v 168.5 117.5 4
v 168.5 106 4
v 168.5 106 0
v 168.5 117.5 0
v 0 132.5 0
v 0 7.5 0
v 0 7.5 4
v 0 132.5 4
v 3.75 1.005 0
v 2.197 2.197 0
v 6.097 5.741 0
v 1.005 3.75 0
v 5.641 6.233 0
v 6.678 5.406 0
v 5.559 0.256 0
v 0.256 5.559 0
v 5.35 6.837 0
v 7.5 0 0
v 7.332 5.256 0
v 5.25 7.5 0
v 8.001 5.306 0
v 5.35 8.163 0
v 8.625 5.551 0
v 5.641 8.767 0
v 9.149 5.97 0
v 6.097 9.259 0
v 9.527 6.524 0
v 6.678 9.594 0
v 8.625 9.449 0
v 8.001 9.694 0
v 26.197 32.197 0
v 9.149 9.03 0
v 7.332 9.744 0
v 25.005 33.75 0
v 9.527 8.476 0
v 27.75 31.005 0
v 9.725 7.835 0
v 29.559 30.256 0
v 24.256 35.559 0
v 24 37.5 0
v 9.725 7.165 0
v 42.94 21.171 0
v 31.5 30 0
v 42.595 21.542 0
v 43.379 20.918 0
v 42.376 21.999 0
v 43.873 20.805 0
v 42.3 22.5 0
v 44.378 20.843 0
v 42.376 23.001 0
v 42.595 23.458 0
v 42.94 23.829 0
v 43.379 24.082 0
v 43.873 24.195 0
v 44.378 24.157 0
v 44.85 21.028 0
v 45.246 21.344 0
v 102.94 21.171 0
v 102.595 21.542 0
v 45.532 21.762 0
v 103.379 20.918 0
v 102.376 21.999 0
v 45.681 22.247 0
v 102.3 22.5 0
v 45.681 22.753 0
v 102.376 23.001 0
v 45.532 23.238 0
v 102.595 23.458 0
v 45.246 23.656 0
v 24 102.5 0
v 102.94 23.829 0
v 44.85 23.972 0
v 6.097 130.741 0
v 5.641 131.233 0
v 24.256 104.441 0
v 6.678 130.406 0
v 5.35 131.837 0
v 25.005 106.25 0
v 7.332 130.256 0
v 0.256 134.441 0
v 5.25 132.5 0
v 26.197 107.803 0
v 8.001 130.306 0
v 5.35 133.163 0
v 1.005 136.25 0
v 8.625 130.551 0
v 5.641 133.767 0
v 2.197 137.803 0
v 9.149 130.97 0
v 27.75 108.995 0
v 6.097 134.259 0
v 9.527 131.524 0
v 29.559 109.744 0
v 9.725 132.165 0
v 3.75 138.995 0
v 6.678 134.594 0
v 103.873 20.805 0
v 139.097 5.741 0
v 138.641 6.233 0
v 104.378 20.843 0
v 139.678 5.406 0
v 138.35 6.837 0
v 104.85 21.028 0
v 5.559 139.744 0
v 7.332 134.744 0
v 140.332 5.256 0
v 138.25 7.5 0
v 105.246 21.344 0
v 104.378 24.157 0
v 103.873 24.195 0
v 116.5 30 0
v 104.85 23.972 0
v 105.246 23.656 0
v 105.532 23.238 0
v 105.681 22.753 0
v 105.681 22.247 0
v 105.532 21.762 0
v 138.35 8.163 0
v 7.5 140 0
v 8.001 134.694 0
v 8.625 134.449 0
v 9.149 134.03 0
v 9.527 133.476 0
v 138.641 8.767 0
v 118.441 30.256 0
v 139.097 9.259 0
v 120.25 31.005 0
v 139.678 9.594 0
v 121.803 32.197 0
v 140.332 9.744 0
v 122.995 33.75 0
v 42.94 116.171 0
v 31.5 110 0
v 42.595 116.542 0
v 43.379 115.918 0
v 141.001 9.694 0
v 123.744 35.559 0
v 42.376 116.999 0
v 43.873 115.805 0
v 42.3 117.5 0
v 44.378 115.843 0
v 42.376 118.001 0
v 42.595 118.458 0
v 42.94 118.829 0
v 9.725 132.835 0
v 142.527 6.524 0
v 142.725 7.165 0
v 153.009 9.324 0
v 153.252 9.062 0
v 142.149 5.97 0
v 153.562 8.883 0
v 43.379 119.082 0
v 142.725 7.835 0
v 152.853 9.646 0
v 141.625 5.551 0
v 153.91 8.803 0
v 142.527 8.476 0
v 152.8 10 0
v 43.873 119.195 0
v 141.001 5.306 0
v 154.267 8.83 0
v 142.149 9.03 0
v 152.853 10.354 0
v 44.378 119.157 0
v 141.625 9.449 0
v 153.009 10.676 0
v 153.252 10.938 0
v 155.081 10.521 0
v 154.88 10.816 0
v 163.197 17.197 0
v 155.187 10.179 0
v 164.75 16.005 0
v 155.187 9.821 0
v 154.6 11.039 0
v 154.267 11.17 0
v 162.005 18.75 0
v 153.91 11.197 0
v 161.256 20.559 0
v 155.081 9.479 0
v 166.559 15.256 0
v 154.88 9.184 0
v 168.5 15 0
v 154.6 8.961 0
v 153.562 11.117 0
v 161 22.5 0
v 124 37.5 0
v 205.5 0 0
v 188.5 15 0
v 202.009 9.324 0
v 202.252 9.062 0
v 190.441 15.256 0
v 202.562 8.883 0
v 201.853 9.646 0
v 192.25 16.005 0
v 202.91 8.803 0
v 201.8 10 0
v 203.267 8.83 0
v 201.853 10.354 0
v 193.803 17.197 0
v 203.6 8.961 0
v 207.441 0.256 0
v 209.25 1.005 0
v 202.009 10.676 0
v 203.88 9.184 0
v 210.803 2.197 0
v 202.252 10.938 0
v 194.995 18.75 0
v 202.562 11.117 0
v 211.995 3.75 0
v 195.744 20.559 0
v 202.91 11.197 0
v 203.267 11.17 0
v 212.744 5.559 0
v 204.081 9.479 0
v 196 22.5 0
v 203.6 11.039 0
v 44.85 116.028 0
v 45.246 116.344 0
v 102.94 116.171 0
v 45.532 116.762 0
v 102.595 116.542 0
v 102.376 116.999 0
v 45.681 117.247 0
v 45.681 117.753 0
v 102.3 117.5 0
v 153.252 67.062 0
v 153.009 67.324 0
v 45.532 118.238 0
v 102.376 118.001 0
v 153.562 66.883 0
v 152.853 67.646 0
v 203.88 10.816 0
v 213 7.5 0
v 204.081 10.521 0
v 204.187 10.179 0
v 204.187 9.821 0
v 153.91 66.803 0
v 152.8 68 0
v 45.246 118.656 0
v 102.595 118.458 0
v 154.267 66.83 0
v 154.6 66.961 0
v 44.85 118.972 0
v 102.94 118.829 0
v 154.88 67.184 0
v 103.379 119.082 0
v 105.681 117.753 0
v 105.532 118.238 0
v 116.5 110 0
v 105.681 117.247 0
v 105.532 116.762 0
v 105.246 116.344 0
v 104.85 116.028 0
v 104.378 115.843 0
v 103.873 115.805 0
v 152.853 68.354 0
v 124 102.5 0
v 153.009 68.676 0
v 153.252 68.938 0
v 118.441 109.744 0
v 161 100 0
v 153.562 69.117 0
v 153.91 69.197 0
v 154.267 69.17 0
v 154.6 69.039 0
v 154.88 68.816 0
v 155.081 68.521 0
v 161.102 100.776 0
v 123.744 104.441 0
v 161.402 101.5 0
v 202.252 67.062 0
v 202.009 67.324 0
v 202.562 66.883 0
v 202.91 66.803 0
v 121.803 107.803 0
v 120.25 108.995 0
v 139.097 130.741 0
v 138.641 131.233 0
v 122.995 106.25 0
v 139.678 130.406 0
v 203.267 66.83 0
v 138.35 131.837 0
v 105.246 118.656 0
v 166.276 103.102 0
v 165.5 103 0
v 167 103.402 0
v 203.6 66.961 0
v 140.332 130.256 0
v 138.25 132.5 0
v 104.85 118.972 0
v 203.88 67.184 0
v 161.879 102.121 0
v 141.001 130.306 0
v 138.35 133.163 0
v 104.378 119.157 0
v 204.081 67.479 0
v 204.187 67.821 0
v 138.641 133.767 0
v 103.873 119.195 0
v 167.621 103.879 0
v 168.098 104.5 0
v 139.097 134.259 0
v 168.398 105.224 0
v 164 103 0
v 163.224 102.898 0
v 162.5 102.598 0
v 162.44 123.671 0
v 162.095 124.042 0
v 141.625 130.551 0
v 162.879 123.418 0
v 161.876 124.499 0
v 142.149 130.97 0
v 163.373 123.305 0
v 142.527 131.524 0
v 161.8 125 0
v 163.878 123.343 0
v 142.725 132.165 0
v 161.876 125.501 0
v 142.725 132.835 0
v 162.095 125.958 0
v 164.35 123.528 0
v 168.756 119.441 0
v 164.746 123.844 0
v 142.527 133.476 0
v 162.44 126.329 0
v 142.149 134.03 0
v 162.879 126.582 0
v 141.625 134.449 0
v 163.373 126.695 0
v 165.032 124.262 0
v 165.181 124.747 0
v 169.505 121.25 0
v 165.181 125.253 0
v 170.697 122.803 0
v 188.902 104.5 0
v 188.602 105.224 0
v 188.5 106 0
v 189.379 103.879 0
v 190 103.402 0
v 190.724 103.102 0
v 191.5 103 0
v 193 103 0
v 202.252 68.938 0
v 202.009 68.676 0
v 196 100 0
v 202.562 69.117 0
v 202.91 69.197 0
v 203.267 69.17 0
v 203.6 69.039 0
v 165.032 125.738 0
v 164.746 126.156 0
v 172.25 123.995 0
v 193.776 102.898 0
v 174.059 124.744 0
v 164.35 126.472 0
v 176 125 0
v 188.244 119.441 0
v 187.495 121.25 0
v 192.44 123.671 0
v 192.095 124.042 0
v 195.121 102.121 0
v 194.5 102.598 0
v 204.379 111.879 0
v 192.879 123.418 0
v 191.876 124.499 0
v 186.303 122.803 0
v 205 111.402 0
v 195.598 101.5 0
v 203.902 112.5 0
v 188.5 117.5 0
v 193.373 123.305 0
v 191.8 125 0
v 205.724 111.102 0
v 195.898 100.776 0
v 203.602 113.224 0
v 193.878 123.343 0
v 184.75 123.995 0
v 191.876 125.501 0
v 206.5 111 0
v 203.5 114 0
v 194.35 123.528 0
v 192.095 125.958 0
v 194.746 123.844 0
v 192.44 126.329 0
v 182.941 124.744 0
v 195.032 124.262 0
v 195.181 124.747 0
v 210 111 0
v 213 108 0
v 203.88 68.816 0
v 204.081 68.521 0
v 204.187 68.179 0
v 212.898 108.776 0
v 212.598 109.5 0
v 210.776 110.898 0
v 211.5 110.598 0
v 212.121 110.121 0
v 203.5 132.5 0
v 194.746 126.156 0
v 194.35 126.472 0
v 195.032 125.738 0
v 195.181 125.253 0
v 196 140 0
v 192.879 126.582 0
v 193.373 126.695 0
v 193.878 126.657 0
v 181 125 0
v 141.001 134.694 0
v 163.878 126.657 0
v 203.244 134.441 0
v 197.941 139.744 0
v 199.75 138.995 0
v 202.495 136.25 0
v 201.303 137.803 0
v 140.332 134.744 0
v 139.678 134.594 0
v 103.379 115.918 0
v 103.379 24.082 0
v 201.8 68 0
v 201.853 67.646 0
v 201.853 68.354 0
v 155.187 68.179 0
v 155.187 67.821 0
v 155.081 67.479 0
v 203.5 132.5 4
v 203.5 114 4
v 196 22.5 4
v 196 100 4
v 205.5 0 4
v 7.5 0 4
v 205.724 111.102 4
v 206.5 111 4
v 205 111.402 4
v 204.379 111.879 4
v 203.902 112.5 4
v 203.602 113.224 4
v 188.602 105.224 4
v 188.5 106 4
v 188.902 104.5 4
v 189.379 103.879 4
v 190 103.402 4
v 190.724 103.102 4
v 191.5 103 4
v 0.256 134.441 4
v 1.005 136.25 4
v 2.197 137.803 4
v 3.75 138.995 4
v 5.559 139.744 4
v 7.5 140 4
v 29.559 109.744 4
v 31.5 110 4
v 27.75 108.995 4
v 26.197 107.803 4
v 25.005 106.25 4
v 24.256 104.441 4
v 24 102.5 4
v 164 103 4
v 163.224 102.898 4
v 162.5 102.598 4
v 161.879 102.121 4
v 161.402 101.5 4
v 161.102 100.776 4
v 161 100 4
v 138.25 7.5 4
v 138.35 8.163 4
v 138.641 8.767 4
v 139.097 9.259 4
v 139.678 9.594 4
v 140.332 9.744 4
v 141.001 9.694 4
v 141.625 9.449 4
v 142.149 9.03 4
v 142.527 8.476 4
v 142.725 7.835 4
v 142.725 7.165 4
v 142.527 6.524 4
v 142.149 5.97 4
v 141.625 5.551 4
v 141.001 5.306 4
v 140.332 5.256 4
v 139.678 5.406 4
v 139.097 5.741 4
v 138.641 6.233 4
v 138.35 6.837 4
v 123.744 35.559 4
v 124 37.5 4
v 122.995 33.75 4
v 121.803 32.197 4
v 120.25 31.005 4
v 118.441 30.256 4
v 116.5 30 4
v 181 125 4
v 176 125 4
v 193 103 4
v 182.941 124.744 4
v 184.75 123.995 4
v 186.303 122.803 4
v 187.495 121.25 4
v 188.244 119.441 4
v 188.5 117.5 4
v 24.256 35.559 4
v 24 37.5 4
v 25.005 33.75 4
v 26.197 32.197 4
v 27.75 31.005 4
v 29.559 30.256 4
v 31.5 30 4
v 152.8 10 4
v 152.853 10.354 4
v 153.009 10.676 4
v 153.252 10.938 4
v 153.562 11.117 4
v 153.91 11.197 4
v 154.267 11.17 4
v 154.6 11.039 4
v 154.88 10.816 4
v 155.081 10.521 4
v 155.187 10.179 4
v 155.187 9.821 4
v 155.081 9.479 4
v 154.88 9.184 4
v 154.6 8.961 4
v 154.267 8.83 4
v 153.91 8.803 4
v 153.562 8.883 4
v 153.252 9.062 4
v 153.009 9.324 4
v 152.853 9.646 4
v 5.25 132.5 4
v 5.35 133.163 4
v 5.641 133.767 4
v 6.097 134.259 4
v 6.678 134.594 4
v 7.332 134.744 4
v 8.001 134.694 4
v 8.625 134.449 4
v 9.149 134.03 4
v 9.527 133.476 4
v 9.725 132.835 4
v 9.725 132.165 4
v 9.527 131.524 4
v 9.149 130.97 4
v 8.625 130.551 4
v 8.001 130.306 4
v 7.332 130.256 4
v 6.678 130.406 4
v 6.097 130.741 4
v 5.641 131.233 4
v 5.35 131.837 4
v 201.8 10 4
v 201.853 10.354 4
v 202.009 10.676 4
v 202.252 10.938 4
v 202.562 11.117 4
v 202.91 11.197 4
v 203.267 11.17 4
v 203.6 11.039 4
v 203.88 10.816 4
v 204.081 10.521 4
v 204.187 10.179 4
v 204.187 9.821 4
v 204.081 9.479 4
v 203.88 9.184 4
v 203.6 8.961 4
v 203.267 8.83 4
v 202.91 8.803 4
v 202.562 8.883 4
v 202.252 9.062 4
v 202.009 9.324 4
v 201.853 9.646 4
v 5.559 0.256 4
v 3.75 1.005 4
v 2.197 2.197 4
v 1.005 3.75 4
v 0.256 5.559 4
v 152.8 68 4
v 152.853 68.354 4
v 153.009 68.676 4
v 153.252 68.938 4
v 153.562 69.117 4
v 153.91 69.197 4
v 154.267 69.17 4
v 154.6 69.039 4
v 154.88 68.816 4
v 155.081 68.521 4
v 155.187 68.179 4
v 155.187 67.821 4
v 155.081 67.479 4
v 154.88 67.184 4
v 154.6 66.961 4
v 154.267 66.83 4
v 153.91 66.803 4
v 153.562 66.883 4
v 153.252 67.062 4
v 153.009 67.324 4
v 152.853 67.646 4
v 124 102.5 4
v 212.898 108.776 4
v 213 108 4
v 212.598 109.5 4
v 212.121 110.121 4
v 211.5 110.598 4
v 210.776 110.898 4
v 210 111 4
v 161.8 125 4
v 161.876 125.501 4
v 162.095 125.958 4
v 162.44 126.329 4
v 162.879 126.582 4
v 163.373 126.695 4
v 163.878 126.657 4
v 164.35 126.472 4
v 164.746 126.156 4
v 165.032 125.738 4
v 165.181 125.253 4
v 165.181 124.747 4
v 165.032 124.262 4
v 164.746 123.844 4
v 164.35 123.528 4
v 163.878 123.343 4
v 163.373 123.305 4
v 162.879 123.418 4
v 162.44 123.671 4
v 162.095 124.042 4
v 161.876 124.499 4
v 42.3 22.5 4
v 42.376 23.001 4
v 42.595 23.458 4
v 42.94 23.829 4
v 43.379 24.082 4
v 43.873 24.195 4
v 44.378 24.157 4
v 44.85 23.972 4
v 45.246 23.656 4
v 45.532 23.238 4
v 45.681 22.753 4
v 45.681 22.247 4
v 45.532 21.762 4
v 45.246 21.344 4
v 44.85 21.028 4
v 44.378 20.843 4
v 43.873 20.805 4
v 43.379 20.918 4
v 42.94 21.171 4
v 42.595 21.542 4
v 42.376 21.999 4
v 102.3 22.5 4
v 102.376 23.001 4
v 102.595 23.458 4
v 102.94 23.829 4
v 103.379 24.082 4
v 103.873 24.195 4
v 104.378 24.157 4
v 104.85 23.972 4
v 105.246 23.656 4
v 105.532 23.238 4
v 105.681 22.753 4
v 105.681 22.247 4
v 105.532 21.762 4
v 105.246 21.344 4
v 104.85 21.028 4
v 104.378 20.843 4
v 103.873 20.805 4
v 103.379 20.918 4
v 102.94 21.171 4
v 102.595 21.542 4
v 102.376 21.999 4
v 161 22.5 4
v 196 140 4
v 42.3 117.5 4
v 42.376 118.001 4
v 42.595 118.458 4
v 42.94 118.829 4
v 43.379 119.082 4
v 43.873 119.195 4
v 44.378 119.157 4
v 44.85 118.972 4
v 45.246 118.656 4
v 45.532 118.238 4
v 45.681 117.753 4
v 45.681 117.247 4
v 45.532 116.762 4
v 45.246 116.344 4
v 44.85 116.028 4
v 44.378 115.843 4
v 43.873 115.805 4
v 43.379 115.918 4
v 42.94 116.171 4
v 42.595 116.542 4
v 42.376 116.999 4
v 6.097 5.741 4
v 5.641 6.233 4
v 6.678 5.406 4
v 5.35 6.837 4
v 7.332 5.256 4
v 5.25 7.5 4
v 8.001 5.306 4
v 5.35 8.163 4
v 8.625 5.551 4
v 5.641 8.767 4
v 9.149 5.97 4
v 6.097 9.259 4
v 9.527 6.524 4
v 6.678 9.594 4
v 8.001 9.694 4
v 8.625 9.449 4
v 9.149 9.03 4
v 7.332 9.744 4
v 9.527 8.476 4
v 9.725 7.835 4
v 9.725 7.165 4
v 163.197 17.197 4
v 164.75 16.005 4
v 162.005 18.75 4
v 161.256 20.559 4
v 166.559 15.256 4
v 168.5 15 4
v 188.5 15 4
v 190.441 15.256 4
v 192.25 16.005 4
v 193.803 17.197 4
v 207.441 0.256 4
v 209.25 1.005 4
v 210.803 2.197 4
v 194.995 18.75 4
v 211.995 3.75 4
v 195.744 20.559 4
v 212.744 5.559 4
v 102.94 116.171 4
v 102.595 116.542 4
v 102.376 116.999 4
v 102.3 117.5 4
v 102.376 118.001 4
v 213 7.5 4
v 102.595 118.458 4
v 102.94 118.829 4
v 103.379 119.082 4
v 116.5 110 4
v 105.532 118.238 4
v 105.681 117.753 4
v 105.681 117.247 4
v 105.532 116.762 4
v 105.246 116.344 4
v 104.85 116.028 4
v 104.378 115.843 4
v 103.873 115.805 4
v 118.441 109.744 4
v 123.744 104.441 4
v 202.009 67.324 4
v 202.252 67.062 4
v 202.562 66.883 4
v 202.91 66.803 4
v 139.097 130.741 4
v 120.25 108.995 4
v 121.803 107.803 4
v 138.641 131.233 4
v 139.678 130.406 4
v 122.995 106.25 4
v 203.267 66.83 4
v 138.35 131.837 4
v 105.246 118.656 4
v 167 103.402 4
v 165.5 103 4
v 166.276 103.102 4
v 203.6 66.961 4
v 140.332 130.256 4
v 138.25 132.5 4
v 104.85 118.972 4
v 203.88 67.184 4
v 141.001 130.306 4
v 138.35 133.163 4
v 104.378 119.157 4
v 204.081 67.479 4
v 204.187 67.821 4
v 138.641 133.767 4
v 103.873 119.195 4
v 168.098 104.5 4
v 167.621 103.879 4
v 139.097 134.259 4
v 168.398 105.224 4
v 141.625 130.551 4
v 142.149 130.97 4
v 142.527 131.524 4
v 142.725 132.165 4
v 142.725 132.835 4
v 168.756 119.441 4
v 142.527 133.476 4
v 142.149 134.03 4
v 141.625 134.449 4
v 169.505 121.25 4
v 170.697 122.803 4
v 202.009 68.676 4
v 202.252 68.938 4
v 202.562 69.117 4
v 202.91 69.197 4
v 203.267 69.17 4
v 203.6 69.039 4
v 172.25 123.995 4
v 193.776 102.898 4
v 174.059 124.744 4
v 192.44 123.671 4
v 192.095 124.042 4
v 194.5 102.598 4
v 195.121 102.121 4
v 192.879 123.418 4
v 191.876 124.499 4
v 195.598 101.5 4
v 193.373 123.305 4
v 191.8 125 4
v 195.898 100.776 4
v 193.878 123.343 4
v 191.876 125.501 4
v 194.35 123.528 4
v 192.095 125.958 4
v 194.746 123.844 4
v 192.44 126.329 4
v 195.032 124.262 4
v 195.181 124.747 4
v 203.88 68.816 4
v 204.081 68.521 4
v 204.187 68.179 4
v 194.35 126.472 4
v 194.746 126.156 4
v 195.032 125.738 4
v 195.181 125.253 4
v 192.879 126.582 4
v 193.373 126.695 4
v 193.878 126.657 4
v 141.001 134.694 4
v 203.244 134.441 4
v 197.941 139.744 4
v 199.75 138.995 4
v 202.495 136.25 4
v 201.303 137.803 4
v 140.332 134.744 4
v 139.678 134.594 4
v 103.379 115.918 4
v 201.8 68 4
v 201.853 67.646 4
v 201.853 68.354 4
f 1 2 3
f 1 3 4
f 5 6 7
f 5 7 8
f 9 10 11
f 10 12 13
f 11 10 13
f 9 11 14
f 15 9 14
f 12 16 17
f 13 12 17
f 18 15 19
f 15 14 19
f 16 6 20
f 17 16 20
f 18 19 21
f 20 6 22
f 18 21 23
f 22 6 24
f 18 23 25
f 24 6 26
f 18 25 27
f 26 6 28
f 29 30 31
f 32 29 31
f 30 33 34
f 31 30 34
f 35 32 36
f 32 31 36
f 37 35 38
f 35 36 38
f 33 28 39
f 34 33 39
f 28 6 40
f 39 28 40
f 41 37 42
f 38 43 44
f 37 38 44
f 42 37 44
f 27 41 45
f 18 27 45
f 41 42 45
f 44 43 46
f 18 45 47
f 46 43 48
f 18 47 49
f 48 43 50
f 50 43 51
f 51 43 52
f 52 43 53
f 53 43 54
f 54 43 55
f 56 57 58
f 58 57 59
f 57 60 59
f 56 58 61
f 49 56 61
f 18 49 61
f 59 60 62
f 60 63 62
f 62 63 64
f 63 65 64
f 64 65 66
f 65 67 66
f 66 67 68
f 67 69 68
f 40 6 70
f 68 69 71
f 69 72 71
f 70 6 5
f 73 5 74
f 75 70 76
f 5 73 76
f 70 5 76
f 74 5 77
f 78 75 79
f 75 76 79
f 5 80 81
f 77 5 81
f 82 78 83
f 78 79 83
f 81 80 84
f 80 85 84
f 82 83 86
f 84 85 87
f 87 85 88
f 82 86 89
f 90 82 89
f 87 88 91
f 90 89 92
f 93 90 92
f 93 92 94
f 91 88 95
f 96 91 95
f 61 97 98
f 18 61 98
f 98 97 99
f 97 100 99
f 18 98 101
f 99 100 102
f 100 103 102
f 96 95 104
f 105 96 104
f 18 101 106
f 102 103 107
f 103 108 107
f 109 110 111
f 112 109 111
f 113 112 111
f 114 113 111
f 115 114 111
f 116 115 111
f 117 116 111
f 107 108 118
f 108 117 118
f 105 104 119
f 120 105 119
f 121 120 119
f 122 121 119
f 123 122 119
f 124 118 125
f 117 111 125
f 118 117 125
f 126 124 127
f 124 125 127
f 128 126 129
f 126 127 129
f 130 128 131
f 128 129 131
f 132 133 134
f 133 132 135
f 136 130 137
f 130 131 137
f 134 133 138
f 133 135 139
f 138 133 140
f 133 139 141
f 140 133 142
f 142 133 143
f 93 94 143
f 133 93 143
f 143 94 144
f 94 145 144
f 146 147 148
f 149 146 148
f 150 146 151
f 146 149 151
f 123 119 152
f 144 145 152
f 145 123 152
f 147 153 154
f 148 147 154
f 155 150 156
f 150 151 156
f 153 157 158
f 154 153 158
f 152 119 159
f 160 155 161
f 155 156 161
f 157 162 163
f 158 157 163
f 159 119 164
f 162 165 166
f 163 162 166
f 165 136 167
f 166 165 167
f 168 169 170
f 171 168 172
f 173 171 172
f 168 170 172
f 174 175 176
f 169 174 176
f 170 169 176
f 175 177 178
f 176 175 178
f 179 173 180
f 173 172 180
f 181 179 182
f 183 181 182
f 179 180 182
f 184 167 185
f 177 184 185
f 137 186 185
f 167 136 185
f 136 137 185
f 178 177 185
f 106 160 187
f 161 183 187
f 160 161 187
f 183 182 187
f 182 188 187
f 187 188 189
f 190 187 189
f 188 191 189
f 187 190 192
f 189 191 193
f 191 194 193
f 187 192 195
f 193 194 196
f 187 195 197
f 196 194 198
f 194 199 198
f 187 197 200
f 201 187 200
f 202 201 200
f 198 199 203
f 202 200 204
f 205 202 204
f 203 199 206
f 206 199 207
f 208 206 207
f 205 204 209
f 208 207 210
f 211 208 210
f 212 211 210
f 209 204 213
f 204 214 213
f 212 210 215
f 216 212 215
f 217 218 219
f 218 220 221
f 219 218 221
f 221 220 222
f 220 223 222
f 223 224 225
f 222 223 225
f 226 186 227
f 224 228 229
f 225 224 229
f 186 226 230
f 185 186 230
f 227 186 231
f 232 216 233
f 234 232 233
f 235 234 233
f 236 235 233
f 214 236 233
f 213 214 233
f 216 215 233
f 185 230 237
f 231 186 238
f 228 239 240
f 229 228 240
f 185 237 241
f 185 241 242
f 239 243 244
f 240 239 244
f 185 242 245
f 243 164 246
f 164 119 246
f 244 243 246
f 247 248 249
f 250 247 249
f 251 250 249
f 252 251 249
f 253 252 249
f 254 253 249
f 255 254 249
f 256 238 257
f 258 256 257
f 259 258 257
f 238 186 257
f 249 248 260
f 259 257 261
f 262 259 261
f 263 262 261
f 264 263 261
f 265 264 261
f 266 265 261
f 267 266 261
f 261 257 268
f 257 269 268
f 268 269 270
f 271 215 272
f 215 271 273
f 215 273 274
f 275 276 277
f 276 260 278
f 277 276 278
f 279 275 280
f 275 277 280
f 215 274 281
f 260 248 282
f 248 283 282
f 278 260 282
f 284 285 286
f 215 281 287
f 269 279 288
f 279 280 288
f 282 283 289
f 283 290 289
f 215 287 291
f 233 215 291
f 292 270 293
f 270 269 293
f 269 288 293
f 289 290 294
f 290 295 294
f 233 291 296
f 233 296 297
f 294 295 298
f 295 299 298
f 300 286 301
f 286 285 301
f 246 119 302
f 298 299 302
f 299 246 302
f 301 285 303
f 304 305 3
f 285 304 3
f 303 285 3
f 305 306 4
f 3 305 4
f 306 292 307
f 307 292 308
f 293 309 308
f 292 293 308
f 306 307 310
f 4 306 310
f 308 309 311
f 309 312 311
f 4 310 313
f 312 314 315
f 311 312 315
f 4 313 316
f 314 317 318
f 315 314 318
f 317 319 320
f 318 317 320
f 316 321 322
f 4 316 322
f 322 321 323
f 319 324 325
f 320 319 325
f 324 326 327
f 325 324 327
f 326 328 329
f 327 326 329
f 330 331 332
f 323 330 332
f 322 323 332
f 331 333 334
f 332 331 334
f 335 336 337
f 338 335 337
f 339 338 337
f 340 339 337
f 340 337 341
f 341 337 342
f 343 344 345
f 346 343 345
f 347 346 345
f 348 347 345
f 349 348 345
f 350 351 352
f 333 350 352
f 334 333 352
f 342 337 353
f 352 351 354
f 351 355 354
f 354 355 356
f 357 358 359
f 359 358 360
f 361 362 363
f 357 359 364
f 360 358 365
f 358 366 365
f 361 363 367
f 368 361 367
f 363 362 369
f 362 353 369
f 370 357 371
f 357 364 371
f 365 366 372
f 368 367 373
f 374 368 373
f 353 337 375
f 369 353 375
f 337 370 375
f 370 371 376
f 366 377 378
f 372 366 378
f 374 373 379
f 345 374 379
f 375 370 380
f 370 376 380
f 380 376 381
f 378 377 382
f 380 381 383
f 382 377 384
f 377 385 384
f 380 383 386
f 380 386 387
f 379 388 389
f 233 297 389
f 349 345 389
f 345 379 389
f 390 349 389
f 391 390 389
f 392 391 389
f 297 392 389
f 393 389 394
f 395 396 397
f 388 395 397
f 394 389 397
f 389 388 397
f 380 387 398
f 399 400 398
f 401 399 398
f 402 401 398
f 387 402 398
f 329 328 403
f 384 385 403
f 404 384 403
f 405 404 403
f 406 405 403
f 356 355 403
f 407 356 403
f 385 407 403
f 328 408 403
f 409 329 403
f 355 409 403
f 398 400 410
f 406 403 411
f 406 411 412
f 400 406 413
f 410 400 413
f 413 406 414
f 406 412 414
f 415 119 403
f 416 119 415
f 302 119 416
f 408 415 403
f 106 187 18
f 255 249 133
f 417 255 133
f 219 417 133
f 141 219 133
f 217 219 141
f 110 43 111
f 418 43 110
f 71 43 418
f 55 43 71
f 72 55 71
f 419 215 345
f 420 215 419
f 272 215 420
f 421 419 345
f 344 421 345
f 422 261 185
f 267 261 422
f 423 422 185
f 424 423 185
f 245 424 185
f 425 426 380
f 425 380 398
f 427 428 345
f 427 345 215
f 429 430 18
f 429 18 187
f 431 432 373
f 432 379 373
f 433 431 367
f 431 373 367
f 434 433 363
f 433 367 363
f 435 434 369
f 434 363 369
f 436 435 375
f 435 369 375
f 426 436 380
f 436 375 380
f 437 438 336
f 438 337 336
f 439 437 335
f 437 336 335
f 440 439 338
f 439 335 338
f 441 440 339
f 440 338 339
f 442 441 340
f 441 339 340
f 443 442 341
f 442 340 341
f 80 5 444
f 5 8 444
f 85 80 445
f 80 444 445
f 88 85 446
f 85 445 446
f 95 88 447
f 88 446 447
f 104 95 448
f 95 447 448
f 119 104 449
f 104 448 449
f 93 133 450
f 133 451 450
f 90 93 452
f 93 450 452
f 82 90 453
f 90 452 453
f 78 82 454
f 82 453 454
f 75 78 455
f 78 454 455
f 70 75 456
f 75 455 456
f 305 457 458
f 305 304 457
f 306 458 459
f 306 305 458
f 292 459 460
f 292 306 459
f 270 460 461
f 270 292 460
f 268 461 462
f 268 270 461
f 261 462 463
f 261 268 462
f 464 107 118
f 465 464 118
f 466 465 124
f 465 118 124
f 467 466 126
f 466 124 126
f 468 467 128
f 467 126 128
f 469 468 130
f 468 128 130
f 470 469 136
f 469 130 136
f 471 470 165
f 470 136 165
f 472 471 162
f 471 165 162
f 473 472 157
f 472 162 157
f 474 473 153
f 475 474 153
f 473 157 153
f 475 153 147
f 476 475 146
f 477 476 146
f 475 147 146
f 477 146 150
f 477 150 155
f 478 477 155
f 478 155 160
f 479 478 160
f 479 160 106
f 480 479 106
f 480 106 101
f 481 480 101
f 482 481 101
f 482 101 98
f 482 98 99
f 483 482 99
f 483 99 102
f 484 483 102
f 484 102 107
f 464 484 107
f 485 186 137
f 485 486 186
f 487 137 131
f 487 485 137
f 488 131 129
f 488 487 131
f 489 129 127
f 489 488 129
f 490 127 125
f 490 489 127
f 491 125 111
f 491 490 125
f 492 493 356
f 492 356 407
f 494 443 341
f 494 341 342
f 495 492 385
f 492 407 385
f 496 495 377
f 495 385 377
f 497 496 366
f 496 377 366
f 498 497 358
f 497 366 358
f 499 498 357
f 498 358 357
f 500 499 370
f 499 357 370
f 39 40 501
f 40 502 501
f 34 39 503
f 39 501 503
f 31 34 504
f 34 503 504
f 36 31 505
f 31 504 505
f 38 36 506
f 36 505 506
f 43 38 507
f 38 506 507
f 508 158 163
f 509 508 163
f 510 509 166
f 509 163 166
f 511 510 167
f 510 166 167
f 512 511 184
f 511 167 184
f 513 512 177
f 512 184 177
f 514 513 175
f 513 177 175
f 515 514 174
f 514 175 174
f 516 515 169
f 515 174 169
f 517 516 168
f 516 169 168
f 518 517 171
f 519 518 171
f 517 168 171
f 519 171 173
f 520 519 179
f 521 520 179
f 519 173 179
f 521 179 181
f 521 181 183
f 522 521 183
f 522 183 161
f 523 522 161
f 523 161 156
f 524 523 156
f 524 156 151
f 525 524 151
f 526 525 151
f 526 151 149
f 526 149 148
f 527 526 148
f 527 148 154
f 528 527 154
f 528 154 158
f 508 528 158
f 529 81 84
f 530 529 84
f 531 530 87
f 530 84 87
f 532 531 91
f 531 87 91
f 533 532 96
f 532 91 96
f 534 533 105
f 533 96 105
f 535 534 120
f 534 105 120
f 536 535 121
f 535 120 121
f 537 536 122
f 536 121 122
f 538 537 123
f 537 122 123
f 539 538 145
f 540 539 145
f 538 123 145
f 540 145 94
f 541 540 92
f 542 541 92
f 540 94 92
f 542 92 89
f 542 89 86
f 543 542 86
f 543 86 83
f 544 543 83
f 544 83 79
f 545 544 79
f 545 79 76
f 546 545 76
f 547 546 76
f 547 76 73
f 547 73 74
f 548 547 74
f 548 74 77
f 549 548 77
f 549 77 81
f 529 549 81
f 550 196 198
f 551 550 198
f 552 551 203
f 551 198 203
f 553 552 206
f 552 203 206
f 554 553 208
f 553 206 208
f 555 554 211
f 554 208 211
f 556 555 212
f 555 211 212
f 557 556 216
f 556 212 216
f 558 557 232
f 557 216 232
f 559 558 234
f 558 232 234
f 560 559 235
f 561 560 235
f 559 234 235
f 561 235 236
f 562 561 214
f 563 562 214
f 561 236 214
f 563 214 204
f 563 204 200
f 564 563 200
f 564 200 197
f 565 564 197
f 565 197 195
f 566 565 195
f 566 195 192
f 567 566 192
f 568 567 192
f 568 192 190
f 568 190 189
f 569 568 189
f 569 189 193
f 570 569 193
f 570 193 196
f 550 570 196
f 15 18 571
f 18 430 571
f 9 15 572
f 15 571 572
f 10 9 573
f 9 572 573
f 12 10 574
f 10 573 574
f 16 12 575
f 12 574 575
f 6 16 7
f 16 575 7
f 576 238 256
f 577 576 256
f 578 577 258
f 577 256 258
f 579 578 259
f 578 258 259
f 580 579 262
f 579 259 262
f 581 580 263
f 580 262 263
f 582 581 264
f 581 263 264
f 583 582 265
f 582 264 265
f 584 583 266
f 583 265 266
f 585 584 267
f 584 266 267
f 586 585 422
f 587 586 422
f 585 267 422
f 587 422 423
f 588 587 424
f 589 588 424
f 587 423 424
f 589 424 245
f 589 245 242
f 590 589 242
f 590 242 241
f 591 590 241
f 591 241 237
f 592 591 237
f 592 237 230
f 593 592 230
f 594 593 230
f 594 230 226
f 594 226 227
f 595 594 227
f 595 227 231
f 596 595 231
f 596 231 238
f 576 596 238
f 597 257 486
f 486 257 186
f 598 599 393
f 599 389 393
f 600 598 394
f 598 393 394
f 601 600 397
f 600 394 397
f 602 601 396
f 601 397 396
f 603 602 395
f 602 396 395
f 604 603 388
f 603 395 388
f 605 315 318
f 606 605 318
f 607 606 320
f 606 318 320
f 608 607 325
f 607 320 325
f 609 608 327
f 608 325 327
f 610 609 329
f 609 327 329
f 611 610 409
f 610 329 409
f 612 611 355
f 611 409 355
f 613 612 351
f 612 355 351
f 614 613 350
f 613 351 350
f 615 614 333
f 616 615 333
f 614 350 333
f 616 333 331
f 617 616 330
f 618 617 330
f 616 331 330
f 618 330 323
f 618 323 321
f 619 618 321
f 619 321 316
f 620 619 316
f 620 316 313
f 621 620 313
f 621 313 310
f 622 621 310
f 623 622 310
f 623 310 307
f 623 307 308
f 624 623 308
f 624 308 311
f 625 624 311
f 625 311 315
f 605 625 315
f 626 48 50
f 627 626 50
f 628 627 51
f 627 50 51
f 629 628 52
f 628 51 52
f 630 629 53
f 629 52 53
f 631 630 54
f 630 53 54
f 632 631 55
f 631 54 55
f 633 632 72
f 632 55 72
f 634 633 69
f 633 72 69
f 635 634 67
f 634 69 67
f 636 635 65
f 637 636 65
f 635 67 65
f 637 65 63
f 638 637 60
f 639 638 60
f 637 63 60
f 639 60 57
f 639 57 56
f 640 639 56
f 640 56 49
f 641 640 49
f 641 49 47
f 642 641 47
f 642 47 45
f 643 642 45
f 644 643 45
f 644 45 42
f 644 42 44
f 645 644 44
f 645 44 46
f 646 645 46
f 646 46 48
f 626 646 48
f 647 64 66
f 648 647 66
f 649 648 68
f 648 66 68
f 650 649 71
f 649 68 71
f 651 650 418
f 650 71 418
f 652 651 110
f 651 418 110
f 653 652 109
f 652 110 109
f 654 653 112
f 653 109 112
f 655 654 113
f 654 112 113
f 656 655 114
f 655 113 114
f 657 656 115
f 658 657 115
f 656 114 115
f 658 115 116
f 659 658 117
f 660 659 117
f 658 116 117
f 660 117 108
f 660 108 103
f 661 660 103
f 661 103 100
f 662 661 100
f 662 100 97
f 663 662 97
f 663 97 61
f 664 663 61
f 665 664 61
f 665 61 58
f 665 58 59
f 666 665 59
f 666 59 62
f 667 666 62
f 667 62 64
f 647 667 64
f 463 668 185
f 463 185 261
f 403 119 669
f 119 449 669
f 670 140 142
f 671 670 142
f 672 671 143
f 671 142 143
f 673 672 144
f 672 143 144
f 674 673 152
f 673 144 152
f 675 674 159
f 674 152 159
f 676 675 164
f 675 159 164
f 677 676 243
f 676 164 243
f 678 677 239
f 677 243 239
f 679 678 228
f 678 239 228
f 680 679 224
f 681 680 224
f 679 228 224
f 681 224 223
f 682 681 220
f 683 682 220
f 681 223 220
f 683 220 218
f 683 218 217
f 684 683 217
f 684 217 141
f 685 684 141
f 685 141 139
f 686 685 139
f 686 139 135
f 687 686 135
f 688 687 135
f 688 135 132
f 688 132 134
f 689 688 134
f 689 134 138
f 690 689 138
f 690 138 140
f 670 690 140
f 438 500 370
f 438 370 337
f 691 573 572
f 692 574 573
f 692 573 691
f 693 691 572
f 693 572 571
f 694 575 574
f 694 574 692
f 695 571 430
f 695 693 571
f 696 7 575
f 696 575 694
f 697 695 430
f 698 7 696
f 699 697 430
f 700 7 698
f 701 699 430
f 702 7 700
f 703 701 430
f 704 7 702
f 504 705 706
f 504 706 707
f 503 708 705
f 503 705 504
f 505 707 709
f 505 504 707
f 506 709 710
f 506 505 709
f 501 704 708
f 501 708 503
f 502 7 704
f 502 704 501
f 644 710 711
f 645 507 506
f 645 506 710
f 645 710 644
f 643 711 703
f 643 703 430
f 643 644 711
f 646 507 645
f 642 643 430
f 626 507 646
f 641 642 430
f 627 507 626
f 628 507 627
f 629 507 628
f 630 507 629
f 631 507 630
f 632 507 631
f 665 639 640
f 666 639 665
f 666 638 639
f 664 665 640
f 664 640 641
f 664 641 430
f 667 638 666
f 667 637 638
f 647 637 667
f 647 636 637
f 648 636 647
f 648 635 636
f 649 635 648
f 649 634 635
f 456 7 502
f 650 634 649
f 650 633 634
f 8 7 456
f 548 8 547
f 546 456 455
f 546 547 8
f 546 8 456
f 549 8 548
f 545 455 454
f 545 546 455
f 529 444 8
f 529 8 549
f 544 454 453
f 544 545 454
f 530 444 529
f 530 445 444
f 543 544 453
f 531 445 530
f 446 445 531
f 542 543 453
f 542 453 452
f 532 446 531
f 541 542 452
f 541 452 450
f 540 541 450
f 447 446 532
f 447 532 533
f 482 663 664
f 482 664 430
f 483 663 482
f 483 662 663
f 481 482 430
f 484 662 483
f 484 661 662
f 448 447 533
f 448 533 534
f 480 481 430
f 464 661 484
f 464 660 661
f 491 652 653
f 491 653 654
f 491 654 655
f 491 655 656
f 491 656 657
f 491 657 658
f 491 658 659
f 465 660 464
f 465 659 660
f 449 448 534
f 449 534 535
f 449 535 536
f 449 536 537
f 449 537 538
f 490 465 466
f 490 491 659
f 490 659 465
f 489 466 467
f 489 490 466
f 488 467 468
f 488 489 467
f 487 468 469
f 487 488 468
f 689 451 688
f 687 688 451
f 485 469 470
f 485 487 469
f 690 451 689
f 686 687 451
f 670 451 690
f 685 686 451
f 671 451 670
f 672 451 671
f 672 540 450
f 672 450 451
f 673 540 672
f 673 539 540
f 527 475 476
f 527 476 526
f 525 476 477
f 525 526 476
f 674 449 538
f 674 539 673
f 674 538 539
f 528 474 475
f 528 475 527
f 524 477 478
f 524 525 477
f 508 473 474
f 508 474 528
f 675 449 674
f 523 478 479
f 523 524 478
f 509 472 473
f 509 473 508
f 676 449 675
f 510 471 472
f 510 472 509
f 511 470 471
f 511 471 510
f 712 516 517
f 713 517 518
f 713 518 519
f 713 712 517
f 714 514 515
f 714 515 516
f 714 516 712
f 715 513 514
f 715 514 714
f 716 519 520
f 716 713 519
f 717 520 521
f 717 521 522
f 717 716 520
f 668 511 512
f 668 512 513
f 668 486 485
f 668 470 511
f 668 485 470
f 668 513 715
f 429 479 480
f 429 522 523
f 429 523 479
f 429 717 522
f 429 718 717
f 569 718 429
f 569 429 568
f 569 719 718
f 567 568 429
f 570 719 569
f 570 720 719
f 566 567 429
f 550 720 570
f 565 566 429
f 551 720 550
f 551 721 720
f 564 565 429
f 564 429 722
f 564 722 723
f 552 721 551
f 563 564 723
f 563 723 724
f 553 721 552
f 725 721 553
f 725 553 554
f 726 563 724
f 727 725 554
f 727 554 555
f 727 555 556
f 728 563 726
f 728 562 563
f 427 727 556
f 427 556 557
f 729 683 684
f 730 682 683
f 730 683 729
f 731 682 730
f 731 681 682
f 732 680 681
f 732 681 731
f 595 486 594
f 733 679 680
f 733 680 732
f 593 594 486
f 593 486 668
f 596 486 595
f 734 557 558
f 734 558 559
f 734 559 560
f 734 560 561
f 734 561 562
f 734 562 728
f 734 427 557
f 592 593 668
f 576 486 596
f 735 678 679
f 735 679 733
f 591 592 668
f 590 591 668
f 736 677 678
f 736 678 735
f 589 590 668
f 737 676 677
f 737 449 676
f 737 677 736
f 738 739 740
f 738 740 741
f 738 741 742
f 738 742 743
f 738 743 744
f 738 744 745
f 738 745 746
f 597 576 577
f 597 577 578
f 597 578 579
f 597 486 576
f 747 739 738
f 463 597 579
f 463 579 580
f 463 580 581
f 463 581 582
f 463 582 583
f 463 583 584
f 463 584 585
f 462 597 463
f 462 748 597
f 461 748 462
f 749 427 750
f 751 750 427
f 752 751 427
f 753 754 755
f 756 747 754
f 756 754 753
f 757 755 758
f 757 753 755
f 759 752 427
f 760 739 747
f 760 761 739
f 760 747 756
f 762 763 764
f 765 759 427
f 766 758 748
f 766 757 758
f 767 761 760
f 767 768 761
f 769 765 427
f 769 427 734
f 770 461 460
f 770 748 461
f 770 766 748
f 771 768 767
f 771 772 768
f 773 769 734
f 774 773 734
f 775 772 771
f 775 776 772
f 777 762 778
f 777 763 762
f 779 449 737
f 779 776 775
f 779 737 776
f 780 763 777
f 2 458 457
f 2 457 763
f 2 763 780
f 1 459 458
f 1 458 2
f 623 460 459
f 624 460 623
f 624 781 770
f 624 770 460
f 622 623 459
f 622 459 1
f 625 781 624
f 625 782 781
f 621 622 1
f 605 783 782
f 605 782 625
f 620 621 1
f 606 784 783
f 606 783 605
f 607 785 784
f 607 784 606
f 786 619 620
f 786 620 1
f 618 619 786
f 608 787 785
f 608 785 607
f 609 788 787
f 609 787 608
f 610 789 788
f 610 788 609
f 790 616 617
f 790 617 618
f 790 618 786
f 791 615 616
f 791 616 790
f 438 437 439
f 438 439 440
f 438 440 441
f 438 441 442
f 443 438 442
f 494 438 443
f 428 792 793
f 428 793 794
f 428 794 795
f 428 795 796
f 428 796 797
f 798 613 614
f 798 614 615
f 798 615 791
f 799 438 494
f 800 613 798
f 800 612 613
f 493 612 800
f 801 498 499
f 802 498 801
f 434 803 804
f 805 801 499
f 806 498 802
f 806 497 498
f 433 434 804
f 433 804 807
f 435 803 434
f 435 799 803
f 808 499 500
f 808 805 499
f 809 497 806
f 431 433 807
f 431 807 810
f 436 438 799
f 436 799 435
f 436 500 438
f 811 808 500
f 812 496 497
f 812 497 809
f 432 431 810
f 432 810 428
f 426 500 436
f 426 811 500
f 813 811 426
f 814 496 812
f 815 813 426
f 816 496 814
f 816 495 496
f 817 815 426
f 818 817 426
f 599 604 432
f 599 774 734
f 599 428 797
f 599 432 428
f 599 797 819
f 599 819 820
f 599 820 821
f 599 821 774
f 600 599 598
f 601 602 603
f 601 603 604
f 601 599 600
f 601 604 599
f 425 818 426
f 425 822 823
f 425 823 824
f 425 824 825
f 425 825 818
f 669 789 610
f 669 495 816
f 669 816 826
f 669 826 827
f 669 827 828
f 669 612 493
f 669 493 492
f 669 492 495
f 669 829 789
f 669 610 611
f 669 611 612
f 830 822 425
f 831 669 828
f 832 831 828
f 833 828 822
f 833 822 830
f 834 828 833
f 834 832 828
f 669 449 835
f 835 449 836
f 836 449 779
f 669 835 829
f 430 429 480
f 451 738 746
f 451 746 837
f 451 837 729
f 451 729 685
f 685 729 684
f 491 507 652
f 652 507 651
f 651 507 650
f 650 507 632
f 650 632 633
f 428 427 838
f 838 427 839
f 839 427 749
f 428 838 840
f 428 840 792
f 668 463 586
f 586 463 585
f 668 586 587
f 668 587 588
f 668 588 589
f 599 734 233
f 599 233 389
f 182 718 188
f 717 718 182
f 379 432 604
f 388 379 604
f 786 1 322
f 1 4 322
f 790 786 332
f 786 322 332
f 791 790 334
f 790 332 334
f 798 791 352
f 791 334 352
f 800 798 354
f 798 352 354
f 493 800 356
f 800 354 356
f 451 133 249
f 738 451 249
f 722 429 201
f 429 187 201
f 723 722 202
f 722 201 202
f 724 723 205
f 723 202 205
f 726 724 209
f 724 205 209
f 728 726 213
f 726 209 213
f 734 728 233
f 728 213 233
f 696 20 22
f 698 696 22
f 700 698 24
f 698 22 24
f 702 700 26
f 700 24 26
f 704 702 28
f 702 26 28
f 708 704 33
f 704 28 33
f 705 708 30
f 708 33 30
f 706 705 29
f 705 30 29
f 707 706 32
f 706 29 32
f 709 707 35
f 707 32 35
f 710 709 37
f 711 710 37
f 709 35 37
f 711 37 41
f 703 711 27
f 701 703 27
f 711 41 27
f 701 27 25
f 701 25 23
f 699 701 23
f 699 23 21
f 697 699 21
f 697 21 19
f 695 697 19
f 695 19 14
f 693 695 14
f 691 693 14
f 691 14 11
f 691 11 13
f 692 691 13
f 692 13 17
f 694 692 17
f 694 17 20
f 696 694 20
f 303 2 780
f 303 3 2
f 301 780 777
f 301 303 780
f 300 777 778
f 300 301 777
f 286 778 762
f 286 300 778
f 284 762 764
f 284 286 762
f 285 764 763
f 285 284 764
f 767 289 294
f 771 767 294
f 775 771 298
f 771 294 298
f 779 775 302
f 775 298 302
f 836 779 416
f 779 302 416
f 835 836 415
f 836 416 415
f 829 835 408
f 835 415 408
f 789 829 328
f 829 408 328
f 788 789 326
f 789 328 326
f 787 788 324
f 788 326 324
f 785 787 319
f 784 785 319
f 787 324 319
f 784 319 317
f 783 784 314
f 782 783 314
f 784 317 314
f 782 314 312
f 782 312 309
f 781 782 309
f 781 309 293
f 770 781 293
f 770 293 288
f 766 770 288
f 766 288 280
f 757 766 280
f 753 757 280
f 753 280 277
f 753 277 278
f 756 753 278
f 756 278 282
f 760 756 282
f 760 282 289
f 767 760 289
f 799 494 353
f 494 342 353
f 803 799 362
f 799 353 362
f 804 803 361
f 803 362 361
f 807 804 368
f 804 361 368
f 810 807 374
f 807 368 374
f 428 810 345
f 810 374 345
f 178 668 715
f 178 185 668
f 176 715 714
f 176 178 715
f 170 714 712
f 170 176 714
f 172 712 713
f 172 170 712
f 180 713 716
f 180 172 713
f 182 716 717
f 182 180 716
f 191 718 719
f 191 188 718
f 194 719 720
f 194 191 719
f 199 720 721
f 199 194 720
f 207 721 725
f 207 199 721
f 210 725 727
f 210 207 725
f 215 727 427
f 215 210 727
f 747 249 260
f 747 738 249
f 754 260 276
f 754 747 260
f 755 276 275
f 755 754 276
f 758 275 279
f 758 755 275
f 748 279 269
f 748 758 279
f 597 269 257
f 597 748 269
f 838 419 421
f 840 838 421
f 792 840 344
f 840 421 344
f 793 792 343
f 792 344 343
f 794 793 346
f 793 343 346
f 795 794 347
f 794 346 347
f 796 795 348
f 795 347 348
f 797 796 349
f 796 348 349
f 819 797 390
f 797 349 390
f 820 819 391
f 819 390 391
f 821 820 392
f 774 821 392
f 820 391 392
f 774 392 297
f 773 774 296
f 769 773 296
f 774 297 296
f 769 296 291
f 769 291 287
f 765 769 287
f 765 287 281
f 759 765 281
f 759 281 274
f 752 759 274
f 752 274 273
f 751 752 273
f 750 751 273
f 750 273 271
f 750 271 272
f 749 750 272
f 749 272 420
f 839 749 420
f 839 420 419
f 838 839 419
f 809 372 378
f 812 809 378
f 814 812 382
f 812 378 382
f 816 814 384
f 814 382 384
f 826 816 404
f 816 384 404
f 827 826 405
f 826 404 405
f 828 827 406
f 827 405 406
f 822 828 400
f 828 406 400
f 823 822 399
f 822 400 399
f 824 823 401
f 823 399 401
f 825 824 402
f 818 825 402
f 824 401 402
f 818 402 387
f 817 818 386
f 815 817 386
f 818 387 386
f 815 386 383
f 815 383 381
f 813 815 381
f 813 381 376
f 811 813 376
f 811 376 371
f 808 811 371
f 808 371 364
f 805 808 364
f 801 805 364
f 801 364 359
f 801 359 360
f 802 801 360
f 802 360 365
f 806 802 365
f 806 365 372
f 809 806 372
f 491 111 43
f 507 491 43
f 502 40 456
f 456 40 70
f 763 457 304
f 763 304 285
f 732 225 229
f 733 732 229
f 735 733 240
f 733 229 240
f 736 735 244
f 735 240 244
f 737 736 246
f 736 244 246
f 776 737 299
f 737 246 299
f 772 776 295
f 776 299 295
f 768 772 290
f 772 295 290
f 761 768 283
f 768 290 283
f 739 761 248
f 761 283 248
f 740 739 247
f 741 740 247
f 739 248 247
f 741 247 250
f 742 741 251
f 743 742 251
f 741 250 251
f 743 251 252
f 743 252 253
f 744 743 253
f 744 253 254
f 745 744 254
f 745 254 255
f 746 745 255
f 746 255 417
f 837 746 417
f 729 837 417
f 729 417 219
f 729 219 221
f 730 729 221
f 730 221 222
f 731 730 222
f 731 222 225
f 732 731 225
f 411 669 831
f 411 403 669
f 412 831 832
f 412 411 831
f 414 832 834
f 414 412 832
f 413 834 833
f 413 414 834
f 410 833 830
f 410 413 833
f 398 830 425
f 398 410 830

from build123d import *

# Parameters (mm, degrees)
SKETCH_1_W          = 140
SKETCH_1_H          = 148
EXTRUDE_1_DEPTH     = 4
HOLE_WIZARD_M4_1_D  = 4.5
HOLE_WIZARD_M3_2_D  = 3.4
SKETCH_9_W          = 65
SKETCH_9_H          = 140
EXTRUDE_3_DEPTH     = 4
HOLE_WIZARD_M2_1_D  = 2.4
SKETCH_13_W         = 9.5
SKETCH_13_H         = 29
CUT_EXTRUDE_1_DEPTH = 5
HOLE_WIZARD_M3_1_D  = 3.4
FILLET_12_R         = 7.5
FILLET_11_R         = 3


with BuildPart() as part:
    # ｽｹｯﾁ1 → ﾎﾞｽ - 押し出し1 (new body)
    with BuildSketch(Plane(origin=(0, 0, 0), x_dir=(0, 1, 0), z_dir=(0, 0, 1))):
        with Locations((70, -74)):
            Rectangle(SKETCH_1_W, SKETCH_1_H)
        Polygon((110, -124), (30, -124), (30, -74), (30, -24), (110, -24), align=None, mode=Mode.SUBTRACT)
    extrude(amount=EXTRUDE_1_DEPTH)

    # M4 すきま穴1 (through all)
    with Locations(Plane.XY.offset(4)):
        with Locations((7.5, 132.5), (140.5, 132.5), (7.5, 7.5), (140.5, 7.5)):
            Hole(HOLE_WIZARD_M4_1_D / 2)

    # M3 すきま穴2 (through all)
    with Locations(Plane.XY.offset(4)):
        with Locations((44, 117.5), (104, 117.5), (104, 22.5), (44, 22.5)):
            Hole(HOLE_WIZARD_M3_2_D / 2)

    # ｽｹｯﾁ9 → ﾎﾞｽ - 押し出し3 (add)
    with BuildSketch(Plane.XY.offset(4)):
        with Locations((180.5, 70)):
            Rectangle(SKETCH_9_W, SKETCH_9_H)
    extrude(amount=-EXTRUDE_3_DEPTH)

    # M2 すきま穴1 (through all)
    with Locations(Plane.XY.offset(4)):
        with Locations((203, 10), (154, 68), (203, 68), (154, 10)):
            Hole(HOLE_WIZARD_M2_1_D / 2)

    # ｽｹｯﾁ13 → ｶｯﾄ - 押し出し1 (cut, through all)
    with BuildSketch(Plane.XY.offset(4)):
        Polygon((168.5, 125), (188.5, 125), (188.5, 103), (196, 103), (196, 15), (161, 15), (161, 103), (168.5, 103), align=None)
        with Locations((208.25, 125.5)):
            Rectangle(SKETCH_13_W, SKETCH_13_H)
    extrude(amount=-CUT_EXTRUDE_1_DEPTH, mode=Mode.SUBTRACT)

    # M3 すきま穴1 (through all)
    with Locations(Plane.XY.offset(4)):
        with Locations((163.5, 125), (193.5, 125)):
            Hole(HOLE_WIZARD_M3_1_D / 2)

    # ﾌｨﾚｯﾄ12
    fillet_12_edges = [part.edges().sort_by_distance(p)[0] for p in [
        (168.5, 125, 2),
        (188.5, 125, 2),
        (196, 15, 2),
        (161, 15, 2),
        (203.5, 140, 2),
        (24, 30, 2),
        (124, 30, 2),
        (124, 110, 2),
        (24, 110, 2),
        (213, 0, 2),
        (0, 0, 2),
        (0, 140, 2),
    ]]
    fillet(fillet_12_edges, radius=FILLET_12_R)

    # ﾌｨﾚｯﾄ11
    fillet_11_edges = [part.edges().sort_by_distance(p)[0] for p in [
        (168.5, 103, 2),
        (188.5, 103, 2),
        (196, 103, 2),
        (161, 103, 2),
        (213, 111, 2),
        (203.5, 111, 2),
    ]]
    fillet(fillet_11_edges, radius=FILLET_11_R)


solid = part.part
